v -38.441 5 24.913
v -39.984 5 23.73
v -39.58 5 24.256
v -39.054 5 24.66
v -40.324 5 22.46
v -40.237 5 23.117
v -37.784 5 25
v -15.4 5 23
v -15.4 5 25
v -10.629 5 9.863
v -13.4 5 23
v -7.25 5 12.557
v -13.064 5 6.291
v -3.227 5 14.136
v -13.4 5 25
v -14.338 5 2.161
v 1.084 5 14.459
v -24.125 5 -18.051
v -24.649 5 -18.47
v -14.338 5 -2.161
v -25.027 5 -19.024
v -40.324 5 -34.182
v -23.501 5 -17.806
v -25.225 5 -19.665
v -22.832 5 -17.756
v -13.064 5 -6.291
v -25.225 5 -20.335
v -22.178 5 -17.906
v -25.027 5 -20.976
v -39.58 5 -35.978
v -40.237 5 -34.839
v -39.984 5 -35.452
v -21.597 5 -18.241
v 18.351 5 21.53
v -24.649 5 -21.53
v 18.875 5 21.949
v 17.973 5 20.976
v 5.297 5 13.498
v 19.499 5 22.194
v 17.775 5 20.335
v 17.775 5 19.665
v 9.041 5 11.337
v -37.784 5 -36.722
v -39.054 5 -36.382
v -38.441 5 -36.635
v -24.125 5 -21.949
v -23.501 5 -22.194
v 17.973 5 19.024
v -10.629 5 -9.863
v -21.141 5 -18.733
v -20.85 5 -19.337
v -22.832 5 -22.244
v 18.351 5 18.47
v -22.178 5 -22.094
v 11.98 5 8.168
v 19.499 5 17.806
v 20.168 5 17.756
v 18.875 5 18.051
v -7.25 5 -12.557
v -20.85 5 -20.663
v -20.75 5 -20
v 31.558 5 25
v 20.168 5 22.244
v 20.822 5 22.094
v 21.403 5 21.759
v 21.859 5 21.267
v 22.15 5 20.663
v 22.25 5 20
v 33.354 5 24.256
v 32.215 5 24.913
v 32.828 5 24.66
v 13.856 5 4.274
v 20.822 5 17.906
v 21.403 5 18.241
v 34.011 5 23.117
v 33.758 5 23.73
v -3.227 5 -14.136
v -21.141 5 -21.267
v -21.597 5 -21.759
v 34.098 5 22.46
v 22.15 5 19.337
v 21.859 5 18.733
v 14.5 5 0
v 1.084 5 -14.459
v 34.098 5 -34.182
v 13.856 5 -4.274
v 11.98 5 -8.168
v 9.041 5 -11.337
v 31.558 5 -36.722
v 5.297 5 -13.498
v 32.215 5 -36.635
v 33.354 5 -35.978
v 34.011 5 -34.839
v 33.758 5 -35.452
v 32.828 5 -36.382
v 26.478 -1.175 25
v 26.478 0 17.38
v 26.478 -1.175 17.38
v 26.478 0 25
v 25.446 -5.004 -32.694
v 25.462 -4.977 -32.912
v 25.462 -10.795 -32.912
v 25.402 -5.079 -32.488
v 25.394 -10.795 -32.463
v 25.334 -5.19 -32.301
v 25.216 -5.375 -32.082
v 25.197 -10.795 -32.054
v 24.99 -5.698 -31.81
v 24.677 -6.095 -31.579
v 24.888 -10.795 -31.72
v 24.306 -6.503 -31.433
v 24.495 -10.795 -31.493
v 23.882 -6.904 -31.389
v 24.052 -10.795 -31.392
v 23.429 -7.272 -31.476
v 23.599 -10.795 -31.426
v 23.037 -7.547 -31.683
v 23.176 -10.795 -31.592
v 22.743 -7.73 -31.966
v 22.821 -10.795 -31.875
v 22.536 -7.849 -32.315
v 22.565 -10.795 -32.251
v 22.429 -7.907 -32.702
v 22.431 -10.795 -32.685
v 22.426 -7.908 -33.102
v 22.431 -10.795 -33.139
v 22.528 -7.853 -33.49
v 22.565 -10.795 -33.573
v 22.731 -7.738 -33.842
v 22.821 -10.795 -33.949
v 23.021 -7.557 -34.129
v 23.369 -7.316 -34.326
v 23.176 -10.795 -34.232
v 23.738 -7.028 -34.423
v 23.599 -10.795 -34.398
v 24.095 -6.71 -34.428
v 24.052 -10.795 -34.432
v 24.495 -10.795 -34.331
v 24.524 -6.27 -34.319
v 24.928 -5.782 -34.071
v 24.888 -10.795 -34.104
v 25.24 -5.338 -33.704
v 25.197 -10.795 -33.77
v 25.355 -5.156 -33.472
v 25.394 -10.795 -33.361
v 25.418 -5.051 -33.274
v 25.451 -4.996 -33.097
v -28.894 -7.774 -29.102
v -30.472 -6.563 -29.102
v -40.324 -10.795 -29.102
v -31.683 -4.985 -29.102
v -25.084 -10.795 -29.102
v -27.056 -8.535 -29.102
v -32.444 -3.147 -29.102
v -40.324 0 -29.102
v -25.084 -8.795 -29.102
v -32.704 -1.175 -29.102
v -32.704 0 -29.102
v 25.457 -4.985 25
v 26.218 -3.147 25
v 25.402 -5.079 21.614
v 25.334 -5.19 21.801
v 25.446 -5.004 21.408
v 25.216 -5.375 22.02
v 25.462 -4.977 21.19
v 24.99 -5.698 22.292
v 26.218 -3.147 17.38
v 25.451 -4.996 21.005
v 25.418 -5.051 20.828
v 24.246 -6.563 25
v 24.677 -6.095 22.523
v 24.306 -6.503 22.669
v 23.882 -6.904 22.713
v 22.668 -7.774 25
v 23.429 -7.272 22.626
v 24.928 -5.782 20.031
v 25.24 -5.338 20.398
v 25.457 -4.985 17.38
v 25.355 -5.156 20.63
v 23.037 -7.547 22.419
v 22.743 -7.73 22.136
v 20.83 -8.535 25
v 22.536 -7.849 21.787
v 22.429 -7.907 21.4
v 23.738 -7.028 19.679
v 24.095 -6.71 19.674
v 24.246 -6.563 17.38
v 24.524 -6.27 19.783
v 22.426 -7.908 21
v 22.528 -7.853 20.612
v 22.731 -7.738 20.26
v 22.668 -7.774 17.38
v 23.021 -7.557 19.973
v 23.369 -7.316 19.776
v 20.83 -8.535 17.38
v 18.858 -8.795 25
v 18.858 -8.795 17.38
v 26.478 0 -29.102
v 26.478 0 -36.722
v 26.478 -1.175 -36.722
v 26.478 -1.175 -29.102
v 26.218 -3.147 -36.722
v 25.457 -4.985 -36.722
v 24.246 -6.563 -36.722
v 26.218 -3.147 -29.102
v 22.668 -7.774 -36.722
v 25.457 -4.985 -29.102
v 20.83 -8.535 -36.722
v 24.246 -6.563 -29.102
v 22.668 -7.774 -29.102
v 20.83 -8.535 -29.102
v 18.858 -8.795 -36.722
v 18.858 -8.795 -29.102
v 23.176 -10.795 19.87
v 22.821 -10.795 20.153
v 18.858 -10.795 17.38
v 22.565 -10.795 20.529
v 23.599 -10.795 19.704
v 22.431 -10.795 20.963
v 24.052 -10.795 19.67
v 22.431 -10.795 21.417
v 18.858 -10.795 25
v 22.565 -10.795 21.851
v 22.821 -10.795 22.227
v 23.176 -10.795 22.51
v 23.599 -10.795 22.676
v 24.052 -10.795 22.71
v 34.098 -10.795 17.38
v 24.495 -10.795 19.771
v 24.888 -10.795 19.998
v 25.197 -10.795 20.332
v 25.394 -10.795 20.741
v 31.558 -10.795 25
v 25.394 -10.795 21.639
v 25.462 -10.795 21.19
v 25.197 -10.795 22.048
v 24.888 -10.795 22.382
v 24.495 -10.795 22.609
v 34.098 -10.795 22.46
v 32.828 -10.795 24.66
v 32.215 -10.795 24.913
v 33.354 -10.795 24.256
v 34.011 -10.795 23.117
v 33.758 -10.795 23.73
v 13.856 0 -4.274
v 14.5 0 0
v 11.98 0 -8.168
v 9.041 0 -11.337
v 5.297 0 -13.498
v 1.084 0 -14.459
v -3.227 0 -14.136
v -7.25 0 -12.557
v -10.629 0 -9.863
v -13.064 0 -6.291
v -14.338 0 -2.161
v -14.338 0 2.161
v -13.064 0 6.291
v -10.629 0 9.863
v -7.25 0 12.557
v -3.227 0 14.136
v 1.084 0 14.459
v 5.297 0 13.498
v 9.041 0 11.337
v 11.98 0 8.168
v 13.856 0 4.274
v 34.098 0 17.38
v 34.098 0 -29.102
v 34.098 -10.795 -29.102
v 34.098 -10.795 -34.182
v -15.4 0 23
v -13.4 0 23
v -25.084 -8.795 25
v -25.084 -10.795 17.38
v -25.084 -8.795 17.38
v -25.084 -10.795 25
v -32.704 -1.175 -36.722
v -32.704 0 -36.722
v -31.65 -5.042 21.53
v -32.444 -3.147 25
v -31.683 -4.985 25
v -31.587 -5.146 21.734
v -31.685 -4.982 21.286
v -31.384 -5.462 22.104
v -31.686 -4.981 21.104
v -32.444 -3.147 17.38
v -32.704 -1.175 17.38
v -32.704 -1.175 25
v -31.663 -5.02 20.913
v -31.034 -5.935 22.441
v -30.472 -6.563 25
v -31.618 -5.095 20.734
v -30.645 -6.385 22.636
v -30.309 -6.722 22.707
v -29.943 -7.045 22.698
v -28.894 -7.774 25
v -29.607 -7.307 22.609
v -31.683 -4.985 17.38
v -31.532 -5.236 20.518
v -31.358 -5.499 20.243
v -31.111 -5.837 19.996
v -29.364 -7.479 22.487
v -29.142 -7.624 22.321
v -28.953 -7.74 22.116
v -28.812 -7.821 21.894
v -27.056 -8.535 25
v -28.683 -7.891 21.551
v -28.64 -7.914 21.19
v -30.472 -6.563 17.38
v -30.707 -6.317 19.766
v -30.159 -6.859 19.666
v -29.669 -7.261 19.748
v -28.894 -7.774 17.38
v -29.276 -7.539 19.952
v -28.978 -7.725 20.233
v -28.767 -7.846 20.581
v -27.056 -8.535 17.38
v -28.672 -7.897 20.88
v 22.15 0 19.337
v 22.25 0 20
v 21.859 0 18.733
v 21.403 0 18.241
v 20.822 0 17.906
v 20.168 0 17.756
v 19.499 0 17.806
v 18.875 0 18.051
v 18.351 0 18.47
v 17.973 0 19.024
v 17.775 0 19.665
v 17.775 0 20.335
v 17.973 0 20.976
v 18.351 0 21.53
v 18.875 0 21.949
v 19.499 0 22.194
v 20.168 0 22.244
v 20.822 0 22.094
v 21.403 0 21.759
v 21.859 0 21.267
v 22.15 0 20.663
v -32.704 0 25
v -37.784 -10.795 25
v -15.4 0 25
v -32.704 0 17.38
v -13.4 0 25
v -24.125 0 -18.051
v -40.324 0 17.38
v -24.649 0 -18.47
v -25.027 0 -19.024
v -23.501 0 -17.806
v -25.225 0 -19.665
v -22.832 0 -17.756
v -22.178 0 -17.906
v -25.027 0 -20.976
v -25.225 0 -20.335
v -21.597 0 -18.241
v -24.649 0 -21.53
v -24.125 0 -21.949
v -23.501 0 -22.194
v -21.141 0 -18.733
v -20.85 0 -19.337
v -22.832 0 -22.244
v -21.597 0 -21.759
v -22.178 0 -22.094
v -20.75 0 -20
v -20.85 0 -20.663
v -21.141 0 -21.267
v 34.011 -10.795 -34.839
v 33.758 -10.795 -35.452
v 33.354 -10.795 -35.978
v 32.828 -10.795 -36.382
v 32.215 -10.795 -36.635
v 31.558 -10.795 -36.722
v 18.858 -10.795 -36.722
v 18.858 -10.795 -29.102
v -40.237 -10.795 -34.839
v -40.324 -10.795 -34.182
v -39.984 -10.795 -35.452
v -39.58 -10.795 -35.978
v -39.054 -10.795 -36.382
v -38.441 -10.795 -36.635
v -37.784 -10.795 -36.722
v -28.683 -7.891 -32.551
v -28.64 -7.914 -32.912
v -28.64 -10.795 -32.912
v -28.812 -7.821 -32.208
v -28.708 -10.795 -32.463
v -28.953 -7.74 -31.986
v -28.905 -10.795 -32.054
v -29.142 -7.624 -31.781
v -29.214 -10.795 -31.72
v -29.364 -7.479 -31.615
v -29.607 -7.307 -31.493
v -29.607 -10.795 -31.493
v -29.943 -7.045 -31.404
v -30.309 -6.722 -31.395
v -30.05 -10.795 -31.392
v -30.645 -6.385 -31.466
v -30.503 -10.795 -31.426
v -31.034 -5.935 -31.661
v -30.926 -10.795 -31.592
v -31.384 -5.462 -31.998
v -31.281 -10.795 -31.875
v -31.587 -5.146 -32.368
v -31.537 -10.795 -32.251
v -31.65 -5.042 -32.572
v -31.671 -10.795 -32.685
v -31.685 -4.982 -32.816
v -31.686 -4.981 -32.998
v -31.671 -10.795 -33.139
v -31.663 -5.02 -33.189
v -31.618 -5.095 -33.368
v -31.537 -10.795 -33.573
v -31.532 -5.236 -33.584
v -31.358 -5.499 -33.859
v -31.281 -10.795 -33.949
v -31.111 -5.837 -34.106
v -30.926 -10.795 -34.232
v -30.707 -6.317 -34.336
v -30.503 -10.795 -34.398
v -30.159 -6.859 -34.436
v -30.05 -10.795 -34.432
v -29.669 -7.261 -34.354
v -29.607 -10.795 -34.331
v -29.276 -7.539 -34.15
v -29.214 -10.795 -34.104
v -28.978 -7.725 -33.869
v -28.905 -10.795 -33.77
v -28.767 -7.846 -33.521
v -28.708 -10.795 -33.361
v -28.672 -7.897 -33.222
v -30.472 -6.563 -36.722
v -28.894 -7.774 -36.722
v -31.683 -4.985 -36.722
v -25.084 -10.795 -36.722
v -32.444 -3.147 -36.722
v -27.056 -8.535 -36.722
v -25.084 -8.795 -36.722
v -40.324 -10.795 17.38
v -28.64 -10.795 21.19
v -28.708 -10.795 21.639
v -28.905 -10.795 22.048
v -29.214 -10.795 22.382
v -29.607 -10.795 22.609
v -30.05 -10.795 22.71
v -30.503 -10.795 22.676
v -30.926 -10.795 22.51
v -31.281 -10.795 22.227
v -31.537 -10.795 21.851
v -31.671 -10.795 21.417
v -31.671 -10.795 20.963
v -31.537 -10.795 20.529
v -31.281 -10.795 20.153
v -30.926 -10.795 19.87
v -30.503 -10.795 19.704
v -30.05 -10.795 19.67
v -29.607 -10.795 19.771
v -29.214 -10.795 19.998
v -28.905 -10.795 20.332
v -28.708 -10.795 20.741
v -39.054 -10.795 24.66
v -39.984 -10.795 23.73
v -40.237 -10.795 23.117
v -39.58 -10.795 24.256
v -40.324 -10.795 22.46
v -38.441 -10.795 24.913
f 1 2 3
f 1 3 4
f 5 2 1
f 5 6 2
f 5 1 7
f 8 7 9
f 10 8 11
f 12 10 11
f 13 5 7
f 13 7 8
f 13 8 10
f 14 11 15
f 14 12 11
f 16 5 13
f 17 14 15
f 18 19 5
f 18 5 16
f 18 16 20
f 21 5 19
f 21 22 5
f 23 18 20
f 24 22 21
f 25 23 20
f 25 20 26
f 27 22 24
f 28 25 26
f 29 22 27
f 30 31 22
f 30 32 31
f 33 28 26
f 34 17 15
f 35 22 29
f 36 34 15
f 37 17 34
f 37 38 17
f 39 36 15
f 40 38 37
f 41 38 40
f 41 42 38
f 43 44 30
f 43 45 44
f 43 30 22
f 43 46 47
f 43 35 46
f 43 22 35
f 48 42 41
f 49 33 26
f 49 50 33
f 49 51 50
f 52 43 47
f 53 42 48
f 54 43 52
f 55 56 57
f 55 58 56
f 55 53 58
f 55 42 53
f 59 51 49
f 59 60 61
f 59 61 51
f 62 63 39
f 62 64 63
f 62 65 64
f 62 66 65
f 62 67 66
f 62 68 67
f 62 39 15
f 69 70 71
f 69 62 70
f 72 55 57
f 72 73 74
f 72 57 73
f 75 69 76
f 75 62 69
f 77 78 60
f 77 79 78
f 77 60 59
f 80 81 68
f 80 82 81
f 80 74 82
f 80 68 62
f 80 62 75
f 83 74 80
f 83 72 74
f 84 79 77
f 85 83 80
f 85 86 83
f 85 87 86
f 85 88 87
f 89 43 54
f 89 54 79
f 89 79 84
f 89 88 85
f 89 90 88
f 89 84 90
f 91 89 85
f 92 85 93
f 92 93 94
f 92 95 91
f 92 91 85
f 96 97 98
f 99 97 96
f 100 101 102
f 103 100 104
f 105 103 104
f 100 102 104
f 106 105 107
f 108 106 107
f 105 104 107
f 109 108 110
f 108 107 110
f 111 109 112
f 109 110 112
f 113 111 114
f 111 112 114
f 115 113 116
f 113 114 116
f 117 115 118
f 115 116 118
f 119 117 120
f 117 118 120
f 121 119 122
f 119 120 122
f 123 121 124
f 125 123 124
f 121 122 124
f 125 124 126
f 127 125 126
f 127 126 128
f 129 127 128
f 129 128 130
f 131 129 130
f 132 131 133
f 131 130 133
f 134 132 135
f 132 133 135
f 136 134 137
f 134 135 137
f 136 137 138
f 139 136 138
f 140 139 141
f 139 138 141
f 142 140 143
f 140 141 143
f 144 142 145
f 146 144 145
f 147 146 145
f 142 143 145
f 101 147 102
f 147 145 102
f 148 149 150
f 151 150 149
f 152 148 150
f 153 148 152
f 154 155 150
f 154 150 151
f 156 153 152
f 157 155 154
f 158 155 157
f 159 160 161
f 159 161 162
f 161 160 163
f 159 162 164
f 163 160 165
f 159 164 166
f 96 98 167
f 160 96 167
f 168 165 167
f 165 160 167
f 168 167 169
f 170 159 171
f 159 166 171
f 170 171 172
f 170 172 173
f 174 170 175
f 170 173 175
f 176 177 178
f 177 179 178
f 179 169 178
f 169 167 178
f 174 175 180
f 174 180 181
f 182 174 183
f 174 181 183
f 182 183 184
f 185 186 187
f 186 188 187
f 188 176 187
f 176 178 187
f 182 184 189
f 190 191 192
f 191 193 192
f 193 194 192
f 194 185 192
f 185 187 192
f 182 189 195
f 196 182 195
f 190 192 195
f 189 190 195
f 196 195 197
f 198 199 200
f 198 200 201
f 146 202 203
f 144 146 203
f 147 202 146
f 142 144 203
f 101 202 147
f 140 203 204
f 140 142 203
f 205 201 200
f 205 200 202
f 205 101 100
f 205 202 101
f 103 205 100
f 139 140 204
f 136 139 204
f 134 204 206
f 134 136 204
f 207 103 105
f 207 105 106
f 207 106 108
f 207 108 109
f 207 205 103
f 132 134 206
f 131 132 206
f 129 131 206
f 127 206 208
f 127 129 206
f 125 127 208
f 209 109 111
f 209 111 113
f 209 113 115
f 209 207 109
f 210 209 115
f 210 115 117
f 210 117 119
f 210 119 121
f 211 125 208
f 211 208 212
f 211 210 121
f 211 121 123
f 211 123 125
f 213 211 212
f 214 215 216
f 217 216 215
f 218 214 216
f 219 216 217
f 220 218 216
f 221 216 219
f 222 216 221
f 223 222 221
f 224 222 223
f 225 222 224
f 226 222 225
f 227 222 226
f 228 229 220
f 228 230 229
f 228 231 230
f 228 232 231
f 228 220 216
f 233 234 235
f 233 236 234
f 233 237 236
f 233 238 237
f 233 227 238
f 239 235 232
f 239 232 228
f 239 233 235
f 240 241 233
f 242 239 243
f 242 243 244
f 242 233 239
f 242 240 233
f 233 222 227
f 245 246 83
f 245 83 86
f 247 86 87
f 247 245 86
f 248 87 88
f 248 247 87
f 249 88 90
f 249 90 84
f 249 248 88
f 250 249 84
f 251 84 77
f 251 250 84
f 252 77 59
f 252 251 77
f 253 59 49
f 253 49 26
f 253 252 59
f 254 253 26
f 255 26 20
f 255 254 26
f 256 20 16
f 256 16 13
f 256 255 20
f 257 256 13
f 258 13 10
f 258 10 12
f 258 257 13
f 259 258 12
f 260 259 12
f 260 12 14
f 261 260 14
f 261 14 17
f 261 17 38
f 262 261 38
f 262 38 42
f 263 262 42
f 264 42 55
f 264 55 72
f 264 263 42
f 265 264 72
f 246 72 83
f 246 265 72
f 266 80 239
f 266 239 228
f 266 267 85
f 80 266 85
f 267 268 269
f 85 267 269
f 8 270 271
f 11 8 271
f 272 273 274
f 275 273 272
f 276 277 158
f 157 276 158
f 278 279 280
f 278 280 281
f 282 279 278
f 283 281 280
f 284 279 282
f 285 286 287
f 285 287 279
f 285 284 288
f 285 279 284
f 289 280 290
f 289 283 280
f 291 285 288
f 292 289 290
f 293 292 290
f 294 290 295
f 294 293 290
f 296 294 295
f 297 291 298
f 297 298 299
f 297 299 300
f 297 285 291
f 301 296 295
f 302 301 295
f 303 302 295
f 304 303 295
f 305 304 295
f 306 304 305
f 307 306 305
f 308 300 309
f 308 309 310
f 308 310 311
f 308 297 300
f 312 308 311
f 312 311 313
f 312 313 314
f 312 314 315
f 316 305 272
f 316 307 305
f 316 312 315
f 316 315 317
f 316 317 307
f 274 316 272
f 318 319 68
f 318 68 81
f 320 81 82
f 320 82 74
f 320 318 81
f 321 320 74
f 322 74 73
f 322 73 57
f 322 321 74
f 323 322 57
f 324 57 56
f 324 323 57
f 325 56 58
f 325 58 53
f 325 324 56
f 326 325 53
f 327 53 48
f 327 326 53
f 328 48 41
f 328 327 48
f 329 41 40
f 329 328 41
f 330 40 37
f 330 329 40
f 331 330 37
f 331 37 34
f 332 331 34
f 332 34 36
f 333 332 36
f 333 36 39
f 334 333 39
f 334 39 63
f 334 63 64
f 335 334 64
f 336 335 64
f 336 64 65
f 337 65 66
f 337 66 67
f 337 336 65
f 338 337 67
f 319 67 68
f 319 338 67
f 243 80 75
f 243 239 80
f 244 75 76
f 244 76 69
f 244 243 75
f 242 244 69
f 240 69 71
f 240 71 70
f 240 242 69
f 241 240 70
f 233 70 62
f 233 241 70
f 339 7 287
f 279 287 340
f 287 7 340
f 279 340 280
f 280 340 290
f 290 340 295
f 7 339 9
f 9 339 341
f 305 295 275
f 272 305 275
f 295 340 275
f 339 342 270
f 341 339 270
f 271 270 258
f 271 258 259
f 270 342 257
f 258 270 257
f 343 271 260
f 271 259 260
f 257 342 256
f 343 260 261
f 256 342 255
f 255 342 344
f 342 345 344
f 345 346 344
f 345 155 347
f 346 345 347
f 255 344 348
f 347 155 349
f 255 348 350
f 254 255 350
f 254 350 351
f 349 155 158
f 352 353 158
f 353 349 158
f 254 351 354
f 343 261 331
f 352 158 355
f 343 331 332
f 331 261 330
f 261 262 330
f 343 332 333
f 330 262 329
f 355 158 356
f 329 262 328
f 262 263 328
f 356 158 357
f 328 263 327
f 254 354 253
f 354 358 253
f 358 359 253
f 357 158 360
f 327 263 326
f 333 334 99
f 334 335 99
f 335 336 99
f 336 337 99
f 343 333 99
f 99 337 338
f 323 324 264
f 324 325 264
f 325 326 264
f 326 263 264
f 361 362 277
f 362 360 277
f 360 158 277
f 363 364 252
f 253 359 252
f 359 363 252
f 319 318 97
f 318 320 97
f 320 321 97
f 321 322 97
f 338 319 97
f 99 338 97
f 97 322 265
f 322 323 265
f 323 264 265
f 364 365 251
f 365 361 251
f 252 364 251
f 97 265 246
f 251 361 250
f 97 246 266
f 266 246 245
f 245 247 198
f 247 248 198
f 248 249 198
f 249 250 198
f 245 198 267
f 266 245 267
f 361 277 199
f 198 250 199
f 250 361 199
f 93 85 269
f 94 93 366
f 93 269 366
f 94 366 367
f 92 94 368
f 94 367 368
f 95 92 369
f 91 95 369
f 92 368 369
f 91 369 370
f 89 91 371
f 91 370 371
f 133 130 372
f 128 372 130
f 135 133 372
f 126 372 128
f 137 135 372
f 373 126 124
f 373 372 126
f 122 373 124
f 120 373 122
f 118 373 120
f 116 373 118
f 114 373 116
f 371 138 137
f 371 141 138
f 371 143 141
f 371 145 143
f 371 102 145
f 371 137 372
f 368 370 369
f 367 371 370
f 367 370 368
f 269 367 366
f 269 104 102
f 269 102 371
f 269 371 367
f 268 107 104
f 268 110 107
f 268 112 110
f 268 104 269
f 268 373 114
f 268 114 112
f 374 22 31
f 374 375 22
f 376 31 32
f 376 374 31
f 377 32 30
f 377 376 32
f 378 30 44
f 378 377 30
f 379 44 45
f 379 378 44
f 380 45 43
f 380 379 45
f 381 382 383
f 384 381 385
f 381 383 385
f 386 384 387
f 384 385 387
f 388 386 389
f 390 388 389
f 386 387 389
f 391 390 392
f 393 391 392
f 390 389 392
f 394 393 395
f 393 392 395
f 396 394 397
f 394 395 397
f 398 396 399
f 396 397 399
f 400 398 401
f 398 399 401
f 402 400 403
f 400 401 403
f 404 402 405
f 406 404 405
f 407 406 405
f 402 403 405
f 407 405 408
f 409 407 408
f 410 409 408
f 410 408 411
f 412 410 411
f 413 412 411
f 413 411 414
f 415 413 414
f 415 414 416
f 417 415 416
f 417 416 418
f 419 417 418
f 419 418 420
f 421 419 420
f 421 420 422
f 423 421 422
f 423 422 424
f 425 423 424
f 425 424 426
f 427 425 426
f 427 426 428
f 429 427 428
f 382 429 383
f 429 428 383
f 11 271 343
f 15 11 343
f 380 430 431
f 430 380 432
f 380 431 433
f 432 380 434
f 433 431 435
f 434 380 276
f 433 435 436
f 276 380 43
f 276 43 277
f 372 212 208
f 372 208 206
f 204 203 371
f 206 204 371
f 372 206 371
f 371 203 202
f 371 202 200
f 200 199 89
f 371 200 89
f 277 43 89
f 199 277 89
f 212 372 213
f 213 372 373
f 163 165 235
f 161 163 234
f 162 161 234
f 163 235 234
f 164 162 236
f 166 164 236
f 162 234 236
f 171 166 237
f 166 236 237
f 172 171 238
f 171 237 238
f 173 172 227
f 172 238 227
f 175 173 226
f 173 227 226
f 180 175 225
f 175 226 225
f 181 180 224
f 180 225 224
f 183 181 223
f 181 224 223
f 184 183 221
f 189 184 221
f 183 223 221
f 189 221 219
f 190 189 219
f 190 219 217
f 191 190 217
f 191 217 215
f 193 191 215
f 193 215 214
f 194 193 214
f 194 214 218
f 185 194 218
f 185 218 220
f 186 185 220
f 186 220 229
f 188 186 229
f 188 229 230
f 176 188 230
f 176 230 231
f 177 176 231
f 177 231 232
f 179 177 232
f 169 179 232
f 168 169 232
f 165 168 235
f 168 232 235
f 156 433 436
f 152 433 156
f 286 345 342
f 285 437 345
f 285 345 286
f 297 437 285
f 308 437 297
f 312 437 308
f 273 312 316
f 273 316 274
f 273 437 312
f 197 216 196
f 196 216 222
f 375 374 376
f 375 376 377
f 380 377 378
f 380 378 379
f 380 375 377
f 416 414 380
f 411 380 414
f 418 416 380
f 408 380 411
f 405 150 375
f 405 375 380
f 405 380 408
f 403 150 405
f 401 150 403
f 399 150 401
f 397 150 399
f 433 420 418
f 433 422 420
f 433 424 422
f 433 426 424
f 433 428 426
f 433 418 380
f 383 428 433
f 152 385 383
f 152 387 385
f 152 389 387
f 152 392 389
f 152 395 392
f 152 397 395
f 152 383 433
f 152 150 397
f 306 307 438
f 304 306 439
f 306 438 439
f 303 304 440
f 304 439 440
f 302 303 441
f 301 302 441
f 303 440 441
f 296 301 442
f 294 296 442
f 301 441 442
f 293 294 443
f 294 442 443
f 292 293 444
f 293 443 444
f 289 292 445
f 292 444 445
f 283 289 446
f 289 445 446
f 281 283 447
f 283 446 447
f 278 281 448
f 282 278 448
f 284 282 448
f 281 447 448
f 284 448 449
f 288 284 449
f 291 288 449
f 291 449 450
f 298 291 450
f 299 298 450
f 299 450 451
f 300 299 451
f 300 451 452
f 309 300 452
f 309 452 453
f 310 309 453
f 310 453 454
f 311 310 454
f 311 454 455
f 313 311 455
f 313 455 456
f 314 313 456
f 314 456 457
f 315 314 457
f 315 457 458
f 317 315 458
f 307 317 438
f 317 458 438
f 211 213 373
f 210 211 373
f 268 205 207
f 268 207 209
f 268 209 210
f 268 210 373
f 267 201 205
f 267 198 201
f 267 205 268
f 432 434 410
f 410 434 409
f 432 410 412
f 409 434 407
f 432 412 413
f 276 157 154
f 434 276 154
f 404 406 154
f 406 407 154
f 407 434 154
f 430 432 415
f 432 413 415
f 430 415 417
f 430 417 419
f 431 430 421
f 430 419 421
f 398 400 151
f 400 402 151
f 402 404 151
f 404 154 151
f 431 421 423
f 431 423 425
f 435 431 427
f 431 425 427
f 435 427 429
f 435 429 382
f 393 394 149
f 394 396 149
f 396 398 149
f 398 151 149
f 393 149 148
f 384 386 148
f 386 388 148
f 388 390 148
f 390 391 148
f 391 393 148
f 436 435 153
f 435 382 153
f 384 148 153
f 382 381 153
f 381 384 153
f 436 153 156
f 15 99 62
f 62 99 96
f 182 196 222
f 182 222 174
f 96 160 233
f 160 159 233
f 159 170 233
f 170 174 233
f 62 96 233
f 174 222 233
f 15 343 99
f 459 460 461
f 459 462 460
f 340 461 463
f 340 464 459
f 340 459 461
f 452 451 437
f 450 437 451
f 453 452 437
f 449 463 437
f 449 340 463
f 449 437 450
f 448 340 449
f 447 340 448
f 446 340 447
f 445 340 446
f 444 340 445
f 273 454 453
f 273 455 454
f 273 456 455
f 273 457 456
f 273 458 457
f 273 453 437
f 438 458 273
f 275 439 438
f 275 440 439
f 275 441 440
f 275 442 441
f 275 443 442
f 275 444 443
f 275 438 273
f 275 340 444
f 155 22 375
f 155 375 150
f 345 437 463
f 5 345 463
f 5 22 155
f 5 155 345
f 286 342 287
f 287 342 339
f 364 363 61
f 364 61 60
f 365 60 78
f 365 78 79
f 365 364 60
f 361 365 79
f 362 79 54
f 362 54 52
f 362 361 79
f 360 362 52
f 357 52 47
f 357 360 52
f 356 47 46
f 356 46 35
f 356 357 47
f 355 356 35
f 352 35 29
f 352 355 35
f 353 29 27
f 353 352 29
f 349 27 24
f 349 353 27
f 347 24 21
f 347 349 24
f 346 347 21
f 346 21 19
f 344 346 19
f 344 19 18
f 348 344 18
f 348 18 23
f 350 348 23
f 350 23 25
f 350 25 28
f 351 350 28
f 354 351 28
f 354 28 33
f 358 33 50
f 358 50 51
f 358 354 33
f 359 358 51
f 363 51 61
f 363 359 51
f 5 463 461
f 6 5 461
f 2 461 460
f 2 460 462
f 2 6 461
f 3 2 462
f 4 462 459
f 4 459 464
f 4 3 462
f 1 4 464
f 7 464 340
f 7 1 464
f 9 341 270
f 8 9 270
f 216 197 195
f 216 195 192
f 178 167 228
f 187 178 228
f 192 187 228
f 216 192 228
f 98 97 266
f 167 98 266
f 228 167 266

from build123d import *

# Parameters (mm, degrees)
SKETCH1_R           = 14.5
SKETCH1_R_2         = 2.25
BOSS_EXTRUDE1_DEPTH = 5
SKETCH2_W           = 7.62
SKETCH2_H           = 7.62
BOSS_EXTRUDE2_DEPTH = 10.795
SKETCH4_W           = 7.62
SKETCH4_H           = 7.62
SKETCH4_R           = 1.524
BOSS_EXTRUDE3_DEPTH = 2
BOSS_EXTRUDE4_START = -7.62
BOSS_EXTRUDE4_DEPTH = 7.62
BOSS_EXTRUDE5_START = -7.62
BOSS_EXTRUDE5_DEPTH = 7.62
SKETCH4_2_R         = 1.524
CUT_EXTRUDE1_DEPTH  = 10.795
FILLET1_R           = 2.54


with BuildPart() as part:
    # Sketch1 → Boss-Extrude1 (new body)
    with BuildSketch(Plane(origin=(0, 0, 0), x_dir=(1, 0, 0), z_dir=(0, 1, 0))):
        Polygon((-40.324, -25), (-15.4, -25), (-15.4, -23), (-13.4, -23), (-13.4, -25), (34.098, -25), (34.098, 36.722), (-40.324, 36.722), align=None)
        Circle(SKETCH1_R, mode=Mode.SUBTRACT)
        with Locations((-23, 20)):
            Circle(SKETCH1_R_2, mode=Mode.SUBTRACT)
        with Locations((20, -20)):
            Circle(SKETCH1_R_2, mode=Mode.SUBTRACT)
    extrude(amount=BOSS_EXTRUDE1_DEPTH)

    # Sketch2 → Boss-Extrude2 (add)
    with BuildSketch(Plane.XZ):
        with Locations((-36.514, 21.19)):
            Rectangle(SKETCH2_W, SKETCH2_H)
        with Locations((30.288, 21.19)):
            Rectangle(SKETCH2_W, SKETCH2_H)
        with Locations((30.288, -32.912)):
            Rectangle(SKETCH2_W, SKETCH2_H)
        with Locations((-36.514, -32.912)):
            Rectangle(SKETCH2_W, SKETCH2_H)
    extrude(amount=BOSS_EXTRUDE2_DEPTH)

    # Sketch4 → Boss-Extrude3 (add)
    with BuildSketch(Plane.XZ.offset(10.795)):
        with Locations((-28.894, 21.19)):
            Rectangle(SKETCH4_W, SKETCH4_H)
        with Locations((-30.164, 21.19)):
            Circle(SKETCH4_R, mode=Mode.SUBTRACT)
        with Locations((-28.894, -32.912)):
            Rectangle(SKETCH4_W, SKETCH4_H)
        with Locations((-30.164, -32.912)):
            Circle(SKETCH4_R, mode=Mode.SUBTRACT)
        with Locations((22.668, -32.912)):
            Rectangle(SKETCH4_W, SKETCH4_H)
        with Locations((23.938, -32.912)):
            Circle(SKETCH4_R, mode=Mode.SUBTRACT)
        with Locations((22.668, 21.19)):
            Rectangle(SKETCH4_W, SKETCH4_H)
        with Locations((23.938, 21.19)):
            Circle(SKETCH4_R, mode=Mode.SUBTRACT)
    extrude(amount=-BOSS_EXTRUDE3_DEPTH)

    # Sketch5 → Boss-Extrude4 (add)
    with BuildSketch(Plane.XY.offset(25).offset(BOSS_EXTRUDE4_START)):
        with BuildLine():
            Line((-25.084, -8.795), (-32.704, -8.795))
            Line((-32.704, -8.795), (-32.704, -1.175))
            ThreePointArc((-32.704, -1.175), (-30.472153673, -6.563153673), (-25.084, -8.795))
        make_face()
        with BuildLine():
            Line((18.858, -8.795), (26.478, -8.795))
            Line((26.478, -8.795), (26.478, -1.175))
            ThreePointArc((26.478, -1.175), (24.246153673, -6.563153673), (18.858, -8.795))
        make_face()
    extrude(amount=BOSS_EXTRUDE4_DEPTH)

    # Sketch6 → Boss-Extrude5 (add)
    with BuildSketch(Plane(origin=(0, 0, -36.722), x_dir=(-1, 0, 0), z_dir=(0, 0, -1)).offset(BOSS_EXTRUDE5_START)):
        with BuildLine():
            Line((-26.478, -8.795), (-26.478, -1.175))
            ThreePointArc((-26.478, -1.175), (-24.246153673, -6.563153673), (-18.858, -8.795))
            Line((-18.858, -8.795), (-26.478, -8.795))
        make_face()
        with BuildLine():
            Line((32.704, -8.795), (32.704, -1.175))
            ThreePointArc((32.704, -1.175), (30.472153673, -6.563153673), (25.084, -8.795))
            Line((25.084, -8.795), (32.704, -8.795))
        make_face()
    extrude(amount=BOSS_EXTRUDE5_DEPTH)

    # Sketch4<2> → Cut-Extrude1 (cut)
    with BuildSketch(Plane.XZ.offset(10.795)):
        with Locations((23.938, 21.19)):
            Circle(SKETCH4_2_R)
        with Locations((-30.164, -32.912)):
            Circle(SKETCH4_2_R)
        with Locations((-30.164, 21.19)):
            Circle(SKETCH4_2_R)
        with Locations((23.938, -32.912)):
            Circle(SKETCH4_2_R)
    extrude(amount=-CUT_EXTRUDE1_DEPTH, mode=Mode.SUBTRACT)

    # Fillet1
    fillet1_edges = [part.edges().sort_by_distance(p)[0] for p in [
        (-40.324, -2.8975, 25),
        (-40.324, -2.8975, -36.722),
        (34.098, -2.8975, -36.722),
        (34.098, -2.8975, 25),
    ]]
    fillet(fillet1_edges, radius=FILLET1_R)


solid = part.part
